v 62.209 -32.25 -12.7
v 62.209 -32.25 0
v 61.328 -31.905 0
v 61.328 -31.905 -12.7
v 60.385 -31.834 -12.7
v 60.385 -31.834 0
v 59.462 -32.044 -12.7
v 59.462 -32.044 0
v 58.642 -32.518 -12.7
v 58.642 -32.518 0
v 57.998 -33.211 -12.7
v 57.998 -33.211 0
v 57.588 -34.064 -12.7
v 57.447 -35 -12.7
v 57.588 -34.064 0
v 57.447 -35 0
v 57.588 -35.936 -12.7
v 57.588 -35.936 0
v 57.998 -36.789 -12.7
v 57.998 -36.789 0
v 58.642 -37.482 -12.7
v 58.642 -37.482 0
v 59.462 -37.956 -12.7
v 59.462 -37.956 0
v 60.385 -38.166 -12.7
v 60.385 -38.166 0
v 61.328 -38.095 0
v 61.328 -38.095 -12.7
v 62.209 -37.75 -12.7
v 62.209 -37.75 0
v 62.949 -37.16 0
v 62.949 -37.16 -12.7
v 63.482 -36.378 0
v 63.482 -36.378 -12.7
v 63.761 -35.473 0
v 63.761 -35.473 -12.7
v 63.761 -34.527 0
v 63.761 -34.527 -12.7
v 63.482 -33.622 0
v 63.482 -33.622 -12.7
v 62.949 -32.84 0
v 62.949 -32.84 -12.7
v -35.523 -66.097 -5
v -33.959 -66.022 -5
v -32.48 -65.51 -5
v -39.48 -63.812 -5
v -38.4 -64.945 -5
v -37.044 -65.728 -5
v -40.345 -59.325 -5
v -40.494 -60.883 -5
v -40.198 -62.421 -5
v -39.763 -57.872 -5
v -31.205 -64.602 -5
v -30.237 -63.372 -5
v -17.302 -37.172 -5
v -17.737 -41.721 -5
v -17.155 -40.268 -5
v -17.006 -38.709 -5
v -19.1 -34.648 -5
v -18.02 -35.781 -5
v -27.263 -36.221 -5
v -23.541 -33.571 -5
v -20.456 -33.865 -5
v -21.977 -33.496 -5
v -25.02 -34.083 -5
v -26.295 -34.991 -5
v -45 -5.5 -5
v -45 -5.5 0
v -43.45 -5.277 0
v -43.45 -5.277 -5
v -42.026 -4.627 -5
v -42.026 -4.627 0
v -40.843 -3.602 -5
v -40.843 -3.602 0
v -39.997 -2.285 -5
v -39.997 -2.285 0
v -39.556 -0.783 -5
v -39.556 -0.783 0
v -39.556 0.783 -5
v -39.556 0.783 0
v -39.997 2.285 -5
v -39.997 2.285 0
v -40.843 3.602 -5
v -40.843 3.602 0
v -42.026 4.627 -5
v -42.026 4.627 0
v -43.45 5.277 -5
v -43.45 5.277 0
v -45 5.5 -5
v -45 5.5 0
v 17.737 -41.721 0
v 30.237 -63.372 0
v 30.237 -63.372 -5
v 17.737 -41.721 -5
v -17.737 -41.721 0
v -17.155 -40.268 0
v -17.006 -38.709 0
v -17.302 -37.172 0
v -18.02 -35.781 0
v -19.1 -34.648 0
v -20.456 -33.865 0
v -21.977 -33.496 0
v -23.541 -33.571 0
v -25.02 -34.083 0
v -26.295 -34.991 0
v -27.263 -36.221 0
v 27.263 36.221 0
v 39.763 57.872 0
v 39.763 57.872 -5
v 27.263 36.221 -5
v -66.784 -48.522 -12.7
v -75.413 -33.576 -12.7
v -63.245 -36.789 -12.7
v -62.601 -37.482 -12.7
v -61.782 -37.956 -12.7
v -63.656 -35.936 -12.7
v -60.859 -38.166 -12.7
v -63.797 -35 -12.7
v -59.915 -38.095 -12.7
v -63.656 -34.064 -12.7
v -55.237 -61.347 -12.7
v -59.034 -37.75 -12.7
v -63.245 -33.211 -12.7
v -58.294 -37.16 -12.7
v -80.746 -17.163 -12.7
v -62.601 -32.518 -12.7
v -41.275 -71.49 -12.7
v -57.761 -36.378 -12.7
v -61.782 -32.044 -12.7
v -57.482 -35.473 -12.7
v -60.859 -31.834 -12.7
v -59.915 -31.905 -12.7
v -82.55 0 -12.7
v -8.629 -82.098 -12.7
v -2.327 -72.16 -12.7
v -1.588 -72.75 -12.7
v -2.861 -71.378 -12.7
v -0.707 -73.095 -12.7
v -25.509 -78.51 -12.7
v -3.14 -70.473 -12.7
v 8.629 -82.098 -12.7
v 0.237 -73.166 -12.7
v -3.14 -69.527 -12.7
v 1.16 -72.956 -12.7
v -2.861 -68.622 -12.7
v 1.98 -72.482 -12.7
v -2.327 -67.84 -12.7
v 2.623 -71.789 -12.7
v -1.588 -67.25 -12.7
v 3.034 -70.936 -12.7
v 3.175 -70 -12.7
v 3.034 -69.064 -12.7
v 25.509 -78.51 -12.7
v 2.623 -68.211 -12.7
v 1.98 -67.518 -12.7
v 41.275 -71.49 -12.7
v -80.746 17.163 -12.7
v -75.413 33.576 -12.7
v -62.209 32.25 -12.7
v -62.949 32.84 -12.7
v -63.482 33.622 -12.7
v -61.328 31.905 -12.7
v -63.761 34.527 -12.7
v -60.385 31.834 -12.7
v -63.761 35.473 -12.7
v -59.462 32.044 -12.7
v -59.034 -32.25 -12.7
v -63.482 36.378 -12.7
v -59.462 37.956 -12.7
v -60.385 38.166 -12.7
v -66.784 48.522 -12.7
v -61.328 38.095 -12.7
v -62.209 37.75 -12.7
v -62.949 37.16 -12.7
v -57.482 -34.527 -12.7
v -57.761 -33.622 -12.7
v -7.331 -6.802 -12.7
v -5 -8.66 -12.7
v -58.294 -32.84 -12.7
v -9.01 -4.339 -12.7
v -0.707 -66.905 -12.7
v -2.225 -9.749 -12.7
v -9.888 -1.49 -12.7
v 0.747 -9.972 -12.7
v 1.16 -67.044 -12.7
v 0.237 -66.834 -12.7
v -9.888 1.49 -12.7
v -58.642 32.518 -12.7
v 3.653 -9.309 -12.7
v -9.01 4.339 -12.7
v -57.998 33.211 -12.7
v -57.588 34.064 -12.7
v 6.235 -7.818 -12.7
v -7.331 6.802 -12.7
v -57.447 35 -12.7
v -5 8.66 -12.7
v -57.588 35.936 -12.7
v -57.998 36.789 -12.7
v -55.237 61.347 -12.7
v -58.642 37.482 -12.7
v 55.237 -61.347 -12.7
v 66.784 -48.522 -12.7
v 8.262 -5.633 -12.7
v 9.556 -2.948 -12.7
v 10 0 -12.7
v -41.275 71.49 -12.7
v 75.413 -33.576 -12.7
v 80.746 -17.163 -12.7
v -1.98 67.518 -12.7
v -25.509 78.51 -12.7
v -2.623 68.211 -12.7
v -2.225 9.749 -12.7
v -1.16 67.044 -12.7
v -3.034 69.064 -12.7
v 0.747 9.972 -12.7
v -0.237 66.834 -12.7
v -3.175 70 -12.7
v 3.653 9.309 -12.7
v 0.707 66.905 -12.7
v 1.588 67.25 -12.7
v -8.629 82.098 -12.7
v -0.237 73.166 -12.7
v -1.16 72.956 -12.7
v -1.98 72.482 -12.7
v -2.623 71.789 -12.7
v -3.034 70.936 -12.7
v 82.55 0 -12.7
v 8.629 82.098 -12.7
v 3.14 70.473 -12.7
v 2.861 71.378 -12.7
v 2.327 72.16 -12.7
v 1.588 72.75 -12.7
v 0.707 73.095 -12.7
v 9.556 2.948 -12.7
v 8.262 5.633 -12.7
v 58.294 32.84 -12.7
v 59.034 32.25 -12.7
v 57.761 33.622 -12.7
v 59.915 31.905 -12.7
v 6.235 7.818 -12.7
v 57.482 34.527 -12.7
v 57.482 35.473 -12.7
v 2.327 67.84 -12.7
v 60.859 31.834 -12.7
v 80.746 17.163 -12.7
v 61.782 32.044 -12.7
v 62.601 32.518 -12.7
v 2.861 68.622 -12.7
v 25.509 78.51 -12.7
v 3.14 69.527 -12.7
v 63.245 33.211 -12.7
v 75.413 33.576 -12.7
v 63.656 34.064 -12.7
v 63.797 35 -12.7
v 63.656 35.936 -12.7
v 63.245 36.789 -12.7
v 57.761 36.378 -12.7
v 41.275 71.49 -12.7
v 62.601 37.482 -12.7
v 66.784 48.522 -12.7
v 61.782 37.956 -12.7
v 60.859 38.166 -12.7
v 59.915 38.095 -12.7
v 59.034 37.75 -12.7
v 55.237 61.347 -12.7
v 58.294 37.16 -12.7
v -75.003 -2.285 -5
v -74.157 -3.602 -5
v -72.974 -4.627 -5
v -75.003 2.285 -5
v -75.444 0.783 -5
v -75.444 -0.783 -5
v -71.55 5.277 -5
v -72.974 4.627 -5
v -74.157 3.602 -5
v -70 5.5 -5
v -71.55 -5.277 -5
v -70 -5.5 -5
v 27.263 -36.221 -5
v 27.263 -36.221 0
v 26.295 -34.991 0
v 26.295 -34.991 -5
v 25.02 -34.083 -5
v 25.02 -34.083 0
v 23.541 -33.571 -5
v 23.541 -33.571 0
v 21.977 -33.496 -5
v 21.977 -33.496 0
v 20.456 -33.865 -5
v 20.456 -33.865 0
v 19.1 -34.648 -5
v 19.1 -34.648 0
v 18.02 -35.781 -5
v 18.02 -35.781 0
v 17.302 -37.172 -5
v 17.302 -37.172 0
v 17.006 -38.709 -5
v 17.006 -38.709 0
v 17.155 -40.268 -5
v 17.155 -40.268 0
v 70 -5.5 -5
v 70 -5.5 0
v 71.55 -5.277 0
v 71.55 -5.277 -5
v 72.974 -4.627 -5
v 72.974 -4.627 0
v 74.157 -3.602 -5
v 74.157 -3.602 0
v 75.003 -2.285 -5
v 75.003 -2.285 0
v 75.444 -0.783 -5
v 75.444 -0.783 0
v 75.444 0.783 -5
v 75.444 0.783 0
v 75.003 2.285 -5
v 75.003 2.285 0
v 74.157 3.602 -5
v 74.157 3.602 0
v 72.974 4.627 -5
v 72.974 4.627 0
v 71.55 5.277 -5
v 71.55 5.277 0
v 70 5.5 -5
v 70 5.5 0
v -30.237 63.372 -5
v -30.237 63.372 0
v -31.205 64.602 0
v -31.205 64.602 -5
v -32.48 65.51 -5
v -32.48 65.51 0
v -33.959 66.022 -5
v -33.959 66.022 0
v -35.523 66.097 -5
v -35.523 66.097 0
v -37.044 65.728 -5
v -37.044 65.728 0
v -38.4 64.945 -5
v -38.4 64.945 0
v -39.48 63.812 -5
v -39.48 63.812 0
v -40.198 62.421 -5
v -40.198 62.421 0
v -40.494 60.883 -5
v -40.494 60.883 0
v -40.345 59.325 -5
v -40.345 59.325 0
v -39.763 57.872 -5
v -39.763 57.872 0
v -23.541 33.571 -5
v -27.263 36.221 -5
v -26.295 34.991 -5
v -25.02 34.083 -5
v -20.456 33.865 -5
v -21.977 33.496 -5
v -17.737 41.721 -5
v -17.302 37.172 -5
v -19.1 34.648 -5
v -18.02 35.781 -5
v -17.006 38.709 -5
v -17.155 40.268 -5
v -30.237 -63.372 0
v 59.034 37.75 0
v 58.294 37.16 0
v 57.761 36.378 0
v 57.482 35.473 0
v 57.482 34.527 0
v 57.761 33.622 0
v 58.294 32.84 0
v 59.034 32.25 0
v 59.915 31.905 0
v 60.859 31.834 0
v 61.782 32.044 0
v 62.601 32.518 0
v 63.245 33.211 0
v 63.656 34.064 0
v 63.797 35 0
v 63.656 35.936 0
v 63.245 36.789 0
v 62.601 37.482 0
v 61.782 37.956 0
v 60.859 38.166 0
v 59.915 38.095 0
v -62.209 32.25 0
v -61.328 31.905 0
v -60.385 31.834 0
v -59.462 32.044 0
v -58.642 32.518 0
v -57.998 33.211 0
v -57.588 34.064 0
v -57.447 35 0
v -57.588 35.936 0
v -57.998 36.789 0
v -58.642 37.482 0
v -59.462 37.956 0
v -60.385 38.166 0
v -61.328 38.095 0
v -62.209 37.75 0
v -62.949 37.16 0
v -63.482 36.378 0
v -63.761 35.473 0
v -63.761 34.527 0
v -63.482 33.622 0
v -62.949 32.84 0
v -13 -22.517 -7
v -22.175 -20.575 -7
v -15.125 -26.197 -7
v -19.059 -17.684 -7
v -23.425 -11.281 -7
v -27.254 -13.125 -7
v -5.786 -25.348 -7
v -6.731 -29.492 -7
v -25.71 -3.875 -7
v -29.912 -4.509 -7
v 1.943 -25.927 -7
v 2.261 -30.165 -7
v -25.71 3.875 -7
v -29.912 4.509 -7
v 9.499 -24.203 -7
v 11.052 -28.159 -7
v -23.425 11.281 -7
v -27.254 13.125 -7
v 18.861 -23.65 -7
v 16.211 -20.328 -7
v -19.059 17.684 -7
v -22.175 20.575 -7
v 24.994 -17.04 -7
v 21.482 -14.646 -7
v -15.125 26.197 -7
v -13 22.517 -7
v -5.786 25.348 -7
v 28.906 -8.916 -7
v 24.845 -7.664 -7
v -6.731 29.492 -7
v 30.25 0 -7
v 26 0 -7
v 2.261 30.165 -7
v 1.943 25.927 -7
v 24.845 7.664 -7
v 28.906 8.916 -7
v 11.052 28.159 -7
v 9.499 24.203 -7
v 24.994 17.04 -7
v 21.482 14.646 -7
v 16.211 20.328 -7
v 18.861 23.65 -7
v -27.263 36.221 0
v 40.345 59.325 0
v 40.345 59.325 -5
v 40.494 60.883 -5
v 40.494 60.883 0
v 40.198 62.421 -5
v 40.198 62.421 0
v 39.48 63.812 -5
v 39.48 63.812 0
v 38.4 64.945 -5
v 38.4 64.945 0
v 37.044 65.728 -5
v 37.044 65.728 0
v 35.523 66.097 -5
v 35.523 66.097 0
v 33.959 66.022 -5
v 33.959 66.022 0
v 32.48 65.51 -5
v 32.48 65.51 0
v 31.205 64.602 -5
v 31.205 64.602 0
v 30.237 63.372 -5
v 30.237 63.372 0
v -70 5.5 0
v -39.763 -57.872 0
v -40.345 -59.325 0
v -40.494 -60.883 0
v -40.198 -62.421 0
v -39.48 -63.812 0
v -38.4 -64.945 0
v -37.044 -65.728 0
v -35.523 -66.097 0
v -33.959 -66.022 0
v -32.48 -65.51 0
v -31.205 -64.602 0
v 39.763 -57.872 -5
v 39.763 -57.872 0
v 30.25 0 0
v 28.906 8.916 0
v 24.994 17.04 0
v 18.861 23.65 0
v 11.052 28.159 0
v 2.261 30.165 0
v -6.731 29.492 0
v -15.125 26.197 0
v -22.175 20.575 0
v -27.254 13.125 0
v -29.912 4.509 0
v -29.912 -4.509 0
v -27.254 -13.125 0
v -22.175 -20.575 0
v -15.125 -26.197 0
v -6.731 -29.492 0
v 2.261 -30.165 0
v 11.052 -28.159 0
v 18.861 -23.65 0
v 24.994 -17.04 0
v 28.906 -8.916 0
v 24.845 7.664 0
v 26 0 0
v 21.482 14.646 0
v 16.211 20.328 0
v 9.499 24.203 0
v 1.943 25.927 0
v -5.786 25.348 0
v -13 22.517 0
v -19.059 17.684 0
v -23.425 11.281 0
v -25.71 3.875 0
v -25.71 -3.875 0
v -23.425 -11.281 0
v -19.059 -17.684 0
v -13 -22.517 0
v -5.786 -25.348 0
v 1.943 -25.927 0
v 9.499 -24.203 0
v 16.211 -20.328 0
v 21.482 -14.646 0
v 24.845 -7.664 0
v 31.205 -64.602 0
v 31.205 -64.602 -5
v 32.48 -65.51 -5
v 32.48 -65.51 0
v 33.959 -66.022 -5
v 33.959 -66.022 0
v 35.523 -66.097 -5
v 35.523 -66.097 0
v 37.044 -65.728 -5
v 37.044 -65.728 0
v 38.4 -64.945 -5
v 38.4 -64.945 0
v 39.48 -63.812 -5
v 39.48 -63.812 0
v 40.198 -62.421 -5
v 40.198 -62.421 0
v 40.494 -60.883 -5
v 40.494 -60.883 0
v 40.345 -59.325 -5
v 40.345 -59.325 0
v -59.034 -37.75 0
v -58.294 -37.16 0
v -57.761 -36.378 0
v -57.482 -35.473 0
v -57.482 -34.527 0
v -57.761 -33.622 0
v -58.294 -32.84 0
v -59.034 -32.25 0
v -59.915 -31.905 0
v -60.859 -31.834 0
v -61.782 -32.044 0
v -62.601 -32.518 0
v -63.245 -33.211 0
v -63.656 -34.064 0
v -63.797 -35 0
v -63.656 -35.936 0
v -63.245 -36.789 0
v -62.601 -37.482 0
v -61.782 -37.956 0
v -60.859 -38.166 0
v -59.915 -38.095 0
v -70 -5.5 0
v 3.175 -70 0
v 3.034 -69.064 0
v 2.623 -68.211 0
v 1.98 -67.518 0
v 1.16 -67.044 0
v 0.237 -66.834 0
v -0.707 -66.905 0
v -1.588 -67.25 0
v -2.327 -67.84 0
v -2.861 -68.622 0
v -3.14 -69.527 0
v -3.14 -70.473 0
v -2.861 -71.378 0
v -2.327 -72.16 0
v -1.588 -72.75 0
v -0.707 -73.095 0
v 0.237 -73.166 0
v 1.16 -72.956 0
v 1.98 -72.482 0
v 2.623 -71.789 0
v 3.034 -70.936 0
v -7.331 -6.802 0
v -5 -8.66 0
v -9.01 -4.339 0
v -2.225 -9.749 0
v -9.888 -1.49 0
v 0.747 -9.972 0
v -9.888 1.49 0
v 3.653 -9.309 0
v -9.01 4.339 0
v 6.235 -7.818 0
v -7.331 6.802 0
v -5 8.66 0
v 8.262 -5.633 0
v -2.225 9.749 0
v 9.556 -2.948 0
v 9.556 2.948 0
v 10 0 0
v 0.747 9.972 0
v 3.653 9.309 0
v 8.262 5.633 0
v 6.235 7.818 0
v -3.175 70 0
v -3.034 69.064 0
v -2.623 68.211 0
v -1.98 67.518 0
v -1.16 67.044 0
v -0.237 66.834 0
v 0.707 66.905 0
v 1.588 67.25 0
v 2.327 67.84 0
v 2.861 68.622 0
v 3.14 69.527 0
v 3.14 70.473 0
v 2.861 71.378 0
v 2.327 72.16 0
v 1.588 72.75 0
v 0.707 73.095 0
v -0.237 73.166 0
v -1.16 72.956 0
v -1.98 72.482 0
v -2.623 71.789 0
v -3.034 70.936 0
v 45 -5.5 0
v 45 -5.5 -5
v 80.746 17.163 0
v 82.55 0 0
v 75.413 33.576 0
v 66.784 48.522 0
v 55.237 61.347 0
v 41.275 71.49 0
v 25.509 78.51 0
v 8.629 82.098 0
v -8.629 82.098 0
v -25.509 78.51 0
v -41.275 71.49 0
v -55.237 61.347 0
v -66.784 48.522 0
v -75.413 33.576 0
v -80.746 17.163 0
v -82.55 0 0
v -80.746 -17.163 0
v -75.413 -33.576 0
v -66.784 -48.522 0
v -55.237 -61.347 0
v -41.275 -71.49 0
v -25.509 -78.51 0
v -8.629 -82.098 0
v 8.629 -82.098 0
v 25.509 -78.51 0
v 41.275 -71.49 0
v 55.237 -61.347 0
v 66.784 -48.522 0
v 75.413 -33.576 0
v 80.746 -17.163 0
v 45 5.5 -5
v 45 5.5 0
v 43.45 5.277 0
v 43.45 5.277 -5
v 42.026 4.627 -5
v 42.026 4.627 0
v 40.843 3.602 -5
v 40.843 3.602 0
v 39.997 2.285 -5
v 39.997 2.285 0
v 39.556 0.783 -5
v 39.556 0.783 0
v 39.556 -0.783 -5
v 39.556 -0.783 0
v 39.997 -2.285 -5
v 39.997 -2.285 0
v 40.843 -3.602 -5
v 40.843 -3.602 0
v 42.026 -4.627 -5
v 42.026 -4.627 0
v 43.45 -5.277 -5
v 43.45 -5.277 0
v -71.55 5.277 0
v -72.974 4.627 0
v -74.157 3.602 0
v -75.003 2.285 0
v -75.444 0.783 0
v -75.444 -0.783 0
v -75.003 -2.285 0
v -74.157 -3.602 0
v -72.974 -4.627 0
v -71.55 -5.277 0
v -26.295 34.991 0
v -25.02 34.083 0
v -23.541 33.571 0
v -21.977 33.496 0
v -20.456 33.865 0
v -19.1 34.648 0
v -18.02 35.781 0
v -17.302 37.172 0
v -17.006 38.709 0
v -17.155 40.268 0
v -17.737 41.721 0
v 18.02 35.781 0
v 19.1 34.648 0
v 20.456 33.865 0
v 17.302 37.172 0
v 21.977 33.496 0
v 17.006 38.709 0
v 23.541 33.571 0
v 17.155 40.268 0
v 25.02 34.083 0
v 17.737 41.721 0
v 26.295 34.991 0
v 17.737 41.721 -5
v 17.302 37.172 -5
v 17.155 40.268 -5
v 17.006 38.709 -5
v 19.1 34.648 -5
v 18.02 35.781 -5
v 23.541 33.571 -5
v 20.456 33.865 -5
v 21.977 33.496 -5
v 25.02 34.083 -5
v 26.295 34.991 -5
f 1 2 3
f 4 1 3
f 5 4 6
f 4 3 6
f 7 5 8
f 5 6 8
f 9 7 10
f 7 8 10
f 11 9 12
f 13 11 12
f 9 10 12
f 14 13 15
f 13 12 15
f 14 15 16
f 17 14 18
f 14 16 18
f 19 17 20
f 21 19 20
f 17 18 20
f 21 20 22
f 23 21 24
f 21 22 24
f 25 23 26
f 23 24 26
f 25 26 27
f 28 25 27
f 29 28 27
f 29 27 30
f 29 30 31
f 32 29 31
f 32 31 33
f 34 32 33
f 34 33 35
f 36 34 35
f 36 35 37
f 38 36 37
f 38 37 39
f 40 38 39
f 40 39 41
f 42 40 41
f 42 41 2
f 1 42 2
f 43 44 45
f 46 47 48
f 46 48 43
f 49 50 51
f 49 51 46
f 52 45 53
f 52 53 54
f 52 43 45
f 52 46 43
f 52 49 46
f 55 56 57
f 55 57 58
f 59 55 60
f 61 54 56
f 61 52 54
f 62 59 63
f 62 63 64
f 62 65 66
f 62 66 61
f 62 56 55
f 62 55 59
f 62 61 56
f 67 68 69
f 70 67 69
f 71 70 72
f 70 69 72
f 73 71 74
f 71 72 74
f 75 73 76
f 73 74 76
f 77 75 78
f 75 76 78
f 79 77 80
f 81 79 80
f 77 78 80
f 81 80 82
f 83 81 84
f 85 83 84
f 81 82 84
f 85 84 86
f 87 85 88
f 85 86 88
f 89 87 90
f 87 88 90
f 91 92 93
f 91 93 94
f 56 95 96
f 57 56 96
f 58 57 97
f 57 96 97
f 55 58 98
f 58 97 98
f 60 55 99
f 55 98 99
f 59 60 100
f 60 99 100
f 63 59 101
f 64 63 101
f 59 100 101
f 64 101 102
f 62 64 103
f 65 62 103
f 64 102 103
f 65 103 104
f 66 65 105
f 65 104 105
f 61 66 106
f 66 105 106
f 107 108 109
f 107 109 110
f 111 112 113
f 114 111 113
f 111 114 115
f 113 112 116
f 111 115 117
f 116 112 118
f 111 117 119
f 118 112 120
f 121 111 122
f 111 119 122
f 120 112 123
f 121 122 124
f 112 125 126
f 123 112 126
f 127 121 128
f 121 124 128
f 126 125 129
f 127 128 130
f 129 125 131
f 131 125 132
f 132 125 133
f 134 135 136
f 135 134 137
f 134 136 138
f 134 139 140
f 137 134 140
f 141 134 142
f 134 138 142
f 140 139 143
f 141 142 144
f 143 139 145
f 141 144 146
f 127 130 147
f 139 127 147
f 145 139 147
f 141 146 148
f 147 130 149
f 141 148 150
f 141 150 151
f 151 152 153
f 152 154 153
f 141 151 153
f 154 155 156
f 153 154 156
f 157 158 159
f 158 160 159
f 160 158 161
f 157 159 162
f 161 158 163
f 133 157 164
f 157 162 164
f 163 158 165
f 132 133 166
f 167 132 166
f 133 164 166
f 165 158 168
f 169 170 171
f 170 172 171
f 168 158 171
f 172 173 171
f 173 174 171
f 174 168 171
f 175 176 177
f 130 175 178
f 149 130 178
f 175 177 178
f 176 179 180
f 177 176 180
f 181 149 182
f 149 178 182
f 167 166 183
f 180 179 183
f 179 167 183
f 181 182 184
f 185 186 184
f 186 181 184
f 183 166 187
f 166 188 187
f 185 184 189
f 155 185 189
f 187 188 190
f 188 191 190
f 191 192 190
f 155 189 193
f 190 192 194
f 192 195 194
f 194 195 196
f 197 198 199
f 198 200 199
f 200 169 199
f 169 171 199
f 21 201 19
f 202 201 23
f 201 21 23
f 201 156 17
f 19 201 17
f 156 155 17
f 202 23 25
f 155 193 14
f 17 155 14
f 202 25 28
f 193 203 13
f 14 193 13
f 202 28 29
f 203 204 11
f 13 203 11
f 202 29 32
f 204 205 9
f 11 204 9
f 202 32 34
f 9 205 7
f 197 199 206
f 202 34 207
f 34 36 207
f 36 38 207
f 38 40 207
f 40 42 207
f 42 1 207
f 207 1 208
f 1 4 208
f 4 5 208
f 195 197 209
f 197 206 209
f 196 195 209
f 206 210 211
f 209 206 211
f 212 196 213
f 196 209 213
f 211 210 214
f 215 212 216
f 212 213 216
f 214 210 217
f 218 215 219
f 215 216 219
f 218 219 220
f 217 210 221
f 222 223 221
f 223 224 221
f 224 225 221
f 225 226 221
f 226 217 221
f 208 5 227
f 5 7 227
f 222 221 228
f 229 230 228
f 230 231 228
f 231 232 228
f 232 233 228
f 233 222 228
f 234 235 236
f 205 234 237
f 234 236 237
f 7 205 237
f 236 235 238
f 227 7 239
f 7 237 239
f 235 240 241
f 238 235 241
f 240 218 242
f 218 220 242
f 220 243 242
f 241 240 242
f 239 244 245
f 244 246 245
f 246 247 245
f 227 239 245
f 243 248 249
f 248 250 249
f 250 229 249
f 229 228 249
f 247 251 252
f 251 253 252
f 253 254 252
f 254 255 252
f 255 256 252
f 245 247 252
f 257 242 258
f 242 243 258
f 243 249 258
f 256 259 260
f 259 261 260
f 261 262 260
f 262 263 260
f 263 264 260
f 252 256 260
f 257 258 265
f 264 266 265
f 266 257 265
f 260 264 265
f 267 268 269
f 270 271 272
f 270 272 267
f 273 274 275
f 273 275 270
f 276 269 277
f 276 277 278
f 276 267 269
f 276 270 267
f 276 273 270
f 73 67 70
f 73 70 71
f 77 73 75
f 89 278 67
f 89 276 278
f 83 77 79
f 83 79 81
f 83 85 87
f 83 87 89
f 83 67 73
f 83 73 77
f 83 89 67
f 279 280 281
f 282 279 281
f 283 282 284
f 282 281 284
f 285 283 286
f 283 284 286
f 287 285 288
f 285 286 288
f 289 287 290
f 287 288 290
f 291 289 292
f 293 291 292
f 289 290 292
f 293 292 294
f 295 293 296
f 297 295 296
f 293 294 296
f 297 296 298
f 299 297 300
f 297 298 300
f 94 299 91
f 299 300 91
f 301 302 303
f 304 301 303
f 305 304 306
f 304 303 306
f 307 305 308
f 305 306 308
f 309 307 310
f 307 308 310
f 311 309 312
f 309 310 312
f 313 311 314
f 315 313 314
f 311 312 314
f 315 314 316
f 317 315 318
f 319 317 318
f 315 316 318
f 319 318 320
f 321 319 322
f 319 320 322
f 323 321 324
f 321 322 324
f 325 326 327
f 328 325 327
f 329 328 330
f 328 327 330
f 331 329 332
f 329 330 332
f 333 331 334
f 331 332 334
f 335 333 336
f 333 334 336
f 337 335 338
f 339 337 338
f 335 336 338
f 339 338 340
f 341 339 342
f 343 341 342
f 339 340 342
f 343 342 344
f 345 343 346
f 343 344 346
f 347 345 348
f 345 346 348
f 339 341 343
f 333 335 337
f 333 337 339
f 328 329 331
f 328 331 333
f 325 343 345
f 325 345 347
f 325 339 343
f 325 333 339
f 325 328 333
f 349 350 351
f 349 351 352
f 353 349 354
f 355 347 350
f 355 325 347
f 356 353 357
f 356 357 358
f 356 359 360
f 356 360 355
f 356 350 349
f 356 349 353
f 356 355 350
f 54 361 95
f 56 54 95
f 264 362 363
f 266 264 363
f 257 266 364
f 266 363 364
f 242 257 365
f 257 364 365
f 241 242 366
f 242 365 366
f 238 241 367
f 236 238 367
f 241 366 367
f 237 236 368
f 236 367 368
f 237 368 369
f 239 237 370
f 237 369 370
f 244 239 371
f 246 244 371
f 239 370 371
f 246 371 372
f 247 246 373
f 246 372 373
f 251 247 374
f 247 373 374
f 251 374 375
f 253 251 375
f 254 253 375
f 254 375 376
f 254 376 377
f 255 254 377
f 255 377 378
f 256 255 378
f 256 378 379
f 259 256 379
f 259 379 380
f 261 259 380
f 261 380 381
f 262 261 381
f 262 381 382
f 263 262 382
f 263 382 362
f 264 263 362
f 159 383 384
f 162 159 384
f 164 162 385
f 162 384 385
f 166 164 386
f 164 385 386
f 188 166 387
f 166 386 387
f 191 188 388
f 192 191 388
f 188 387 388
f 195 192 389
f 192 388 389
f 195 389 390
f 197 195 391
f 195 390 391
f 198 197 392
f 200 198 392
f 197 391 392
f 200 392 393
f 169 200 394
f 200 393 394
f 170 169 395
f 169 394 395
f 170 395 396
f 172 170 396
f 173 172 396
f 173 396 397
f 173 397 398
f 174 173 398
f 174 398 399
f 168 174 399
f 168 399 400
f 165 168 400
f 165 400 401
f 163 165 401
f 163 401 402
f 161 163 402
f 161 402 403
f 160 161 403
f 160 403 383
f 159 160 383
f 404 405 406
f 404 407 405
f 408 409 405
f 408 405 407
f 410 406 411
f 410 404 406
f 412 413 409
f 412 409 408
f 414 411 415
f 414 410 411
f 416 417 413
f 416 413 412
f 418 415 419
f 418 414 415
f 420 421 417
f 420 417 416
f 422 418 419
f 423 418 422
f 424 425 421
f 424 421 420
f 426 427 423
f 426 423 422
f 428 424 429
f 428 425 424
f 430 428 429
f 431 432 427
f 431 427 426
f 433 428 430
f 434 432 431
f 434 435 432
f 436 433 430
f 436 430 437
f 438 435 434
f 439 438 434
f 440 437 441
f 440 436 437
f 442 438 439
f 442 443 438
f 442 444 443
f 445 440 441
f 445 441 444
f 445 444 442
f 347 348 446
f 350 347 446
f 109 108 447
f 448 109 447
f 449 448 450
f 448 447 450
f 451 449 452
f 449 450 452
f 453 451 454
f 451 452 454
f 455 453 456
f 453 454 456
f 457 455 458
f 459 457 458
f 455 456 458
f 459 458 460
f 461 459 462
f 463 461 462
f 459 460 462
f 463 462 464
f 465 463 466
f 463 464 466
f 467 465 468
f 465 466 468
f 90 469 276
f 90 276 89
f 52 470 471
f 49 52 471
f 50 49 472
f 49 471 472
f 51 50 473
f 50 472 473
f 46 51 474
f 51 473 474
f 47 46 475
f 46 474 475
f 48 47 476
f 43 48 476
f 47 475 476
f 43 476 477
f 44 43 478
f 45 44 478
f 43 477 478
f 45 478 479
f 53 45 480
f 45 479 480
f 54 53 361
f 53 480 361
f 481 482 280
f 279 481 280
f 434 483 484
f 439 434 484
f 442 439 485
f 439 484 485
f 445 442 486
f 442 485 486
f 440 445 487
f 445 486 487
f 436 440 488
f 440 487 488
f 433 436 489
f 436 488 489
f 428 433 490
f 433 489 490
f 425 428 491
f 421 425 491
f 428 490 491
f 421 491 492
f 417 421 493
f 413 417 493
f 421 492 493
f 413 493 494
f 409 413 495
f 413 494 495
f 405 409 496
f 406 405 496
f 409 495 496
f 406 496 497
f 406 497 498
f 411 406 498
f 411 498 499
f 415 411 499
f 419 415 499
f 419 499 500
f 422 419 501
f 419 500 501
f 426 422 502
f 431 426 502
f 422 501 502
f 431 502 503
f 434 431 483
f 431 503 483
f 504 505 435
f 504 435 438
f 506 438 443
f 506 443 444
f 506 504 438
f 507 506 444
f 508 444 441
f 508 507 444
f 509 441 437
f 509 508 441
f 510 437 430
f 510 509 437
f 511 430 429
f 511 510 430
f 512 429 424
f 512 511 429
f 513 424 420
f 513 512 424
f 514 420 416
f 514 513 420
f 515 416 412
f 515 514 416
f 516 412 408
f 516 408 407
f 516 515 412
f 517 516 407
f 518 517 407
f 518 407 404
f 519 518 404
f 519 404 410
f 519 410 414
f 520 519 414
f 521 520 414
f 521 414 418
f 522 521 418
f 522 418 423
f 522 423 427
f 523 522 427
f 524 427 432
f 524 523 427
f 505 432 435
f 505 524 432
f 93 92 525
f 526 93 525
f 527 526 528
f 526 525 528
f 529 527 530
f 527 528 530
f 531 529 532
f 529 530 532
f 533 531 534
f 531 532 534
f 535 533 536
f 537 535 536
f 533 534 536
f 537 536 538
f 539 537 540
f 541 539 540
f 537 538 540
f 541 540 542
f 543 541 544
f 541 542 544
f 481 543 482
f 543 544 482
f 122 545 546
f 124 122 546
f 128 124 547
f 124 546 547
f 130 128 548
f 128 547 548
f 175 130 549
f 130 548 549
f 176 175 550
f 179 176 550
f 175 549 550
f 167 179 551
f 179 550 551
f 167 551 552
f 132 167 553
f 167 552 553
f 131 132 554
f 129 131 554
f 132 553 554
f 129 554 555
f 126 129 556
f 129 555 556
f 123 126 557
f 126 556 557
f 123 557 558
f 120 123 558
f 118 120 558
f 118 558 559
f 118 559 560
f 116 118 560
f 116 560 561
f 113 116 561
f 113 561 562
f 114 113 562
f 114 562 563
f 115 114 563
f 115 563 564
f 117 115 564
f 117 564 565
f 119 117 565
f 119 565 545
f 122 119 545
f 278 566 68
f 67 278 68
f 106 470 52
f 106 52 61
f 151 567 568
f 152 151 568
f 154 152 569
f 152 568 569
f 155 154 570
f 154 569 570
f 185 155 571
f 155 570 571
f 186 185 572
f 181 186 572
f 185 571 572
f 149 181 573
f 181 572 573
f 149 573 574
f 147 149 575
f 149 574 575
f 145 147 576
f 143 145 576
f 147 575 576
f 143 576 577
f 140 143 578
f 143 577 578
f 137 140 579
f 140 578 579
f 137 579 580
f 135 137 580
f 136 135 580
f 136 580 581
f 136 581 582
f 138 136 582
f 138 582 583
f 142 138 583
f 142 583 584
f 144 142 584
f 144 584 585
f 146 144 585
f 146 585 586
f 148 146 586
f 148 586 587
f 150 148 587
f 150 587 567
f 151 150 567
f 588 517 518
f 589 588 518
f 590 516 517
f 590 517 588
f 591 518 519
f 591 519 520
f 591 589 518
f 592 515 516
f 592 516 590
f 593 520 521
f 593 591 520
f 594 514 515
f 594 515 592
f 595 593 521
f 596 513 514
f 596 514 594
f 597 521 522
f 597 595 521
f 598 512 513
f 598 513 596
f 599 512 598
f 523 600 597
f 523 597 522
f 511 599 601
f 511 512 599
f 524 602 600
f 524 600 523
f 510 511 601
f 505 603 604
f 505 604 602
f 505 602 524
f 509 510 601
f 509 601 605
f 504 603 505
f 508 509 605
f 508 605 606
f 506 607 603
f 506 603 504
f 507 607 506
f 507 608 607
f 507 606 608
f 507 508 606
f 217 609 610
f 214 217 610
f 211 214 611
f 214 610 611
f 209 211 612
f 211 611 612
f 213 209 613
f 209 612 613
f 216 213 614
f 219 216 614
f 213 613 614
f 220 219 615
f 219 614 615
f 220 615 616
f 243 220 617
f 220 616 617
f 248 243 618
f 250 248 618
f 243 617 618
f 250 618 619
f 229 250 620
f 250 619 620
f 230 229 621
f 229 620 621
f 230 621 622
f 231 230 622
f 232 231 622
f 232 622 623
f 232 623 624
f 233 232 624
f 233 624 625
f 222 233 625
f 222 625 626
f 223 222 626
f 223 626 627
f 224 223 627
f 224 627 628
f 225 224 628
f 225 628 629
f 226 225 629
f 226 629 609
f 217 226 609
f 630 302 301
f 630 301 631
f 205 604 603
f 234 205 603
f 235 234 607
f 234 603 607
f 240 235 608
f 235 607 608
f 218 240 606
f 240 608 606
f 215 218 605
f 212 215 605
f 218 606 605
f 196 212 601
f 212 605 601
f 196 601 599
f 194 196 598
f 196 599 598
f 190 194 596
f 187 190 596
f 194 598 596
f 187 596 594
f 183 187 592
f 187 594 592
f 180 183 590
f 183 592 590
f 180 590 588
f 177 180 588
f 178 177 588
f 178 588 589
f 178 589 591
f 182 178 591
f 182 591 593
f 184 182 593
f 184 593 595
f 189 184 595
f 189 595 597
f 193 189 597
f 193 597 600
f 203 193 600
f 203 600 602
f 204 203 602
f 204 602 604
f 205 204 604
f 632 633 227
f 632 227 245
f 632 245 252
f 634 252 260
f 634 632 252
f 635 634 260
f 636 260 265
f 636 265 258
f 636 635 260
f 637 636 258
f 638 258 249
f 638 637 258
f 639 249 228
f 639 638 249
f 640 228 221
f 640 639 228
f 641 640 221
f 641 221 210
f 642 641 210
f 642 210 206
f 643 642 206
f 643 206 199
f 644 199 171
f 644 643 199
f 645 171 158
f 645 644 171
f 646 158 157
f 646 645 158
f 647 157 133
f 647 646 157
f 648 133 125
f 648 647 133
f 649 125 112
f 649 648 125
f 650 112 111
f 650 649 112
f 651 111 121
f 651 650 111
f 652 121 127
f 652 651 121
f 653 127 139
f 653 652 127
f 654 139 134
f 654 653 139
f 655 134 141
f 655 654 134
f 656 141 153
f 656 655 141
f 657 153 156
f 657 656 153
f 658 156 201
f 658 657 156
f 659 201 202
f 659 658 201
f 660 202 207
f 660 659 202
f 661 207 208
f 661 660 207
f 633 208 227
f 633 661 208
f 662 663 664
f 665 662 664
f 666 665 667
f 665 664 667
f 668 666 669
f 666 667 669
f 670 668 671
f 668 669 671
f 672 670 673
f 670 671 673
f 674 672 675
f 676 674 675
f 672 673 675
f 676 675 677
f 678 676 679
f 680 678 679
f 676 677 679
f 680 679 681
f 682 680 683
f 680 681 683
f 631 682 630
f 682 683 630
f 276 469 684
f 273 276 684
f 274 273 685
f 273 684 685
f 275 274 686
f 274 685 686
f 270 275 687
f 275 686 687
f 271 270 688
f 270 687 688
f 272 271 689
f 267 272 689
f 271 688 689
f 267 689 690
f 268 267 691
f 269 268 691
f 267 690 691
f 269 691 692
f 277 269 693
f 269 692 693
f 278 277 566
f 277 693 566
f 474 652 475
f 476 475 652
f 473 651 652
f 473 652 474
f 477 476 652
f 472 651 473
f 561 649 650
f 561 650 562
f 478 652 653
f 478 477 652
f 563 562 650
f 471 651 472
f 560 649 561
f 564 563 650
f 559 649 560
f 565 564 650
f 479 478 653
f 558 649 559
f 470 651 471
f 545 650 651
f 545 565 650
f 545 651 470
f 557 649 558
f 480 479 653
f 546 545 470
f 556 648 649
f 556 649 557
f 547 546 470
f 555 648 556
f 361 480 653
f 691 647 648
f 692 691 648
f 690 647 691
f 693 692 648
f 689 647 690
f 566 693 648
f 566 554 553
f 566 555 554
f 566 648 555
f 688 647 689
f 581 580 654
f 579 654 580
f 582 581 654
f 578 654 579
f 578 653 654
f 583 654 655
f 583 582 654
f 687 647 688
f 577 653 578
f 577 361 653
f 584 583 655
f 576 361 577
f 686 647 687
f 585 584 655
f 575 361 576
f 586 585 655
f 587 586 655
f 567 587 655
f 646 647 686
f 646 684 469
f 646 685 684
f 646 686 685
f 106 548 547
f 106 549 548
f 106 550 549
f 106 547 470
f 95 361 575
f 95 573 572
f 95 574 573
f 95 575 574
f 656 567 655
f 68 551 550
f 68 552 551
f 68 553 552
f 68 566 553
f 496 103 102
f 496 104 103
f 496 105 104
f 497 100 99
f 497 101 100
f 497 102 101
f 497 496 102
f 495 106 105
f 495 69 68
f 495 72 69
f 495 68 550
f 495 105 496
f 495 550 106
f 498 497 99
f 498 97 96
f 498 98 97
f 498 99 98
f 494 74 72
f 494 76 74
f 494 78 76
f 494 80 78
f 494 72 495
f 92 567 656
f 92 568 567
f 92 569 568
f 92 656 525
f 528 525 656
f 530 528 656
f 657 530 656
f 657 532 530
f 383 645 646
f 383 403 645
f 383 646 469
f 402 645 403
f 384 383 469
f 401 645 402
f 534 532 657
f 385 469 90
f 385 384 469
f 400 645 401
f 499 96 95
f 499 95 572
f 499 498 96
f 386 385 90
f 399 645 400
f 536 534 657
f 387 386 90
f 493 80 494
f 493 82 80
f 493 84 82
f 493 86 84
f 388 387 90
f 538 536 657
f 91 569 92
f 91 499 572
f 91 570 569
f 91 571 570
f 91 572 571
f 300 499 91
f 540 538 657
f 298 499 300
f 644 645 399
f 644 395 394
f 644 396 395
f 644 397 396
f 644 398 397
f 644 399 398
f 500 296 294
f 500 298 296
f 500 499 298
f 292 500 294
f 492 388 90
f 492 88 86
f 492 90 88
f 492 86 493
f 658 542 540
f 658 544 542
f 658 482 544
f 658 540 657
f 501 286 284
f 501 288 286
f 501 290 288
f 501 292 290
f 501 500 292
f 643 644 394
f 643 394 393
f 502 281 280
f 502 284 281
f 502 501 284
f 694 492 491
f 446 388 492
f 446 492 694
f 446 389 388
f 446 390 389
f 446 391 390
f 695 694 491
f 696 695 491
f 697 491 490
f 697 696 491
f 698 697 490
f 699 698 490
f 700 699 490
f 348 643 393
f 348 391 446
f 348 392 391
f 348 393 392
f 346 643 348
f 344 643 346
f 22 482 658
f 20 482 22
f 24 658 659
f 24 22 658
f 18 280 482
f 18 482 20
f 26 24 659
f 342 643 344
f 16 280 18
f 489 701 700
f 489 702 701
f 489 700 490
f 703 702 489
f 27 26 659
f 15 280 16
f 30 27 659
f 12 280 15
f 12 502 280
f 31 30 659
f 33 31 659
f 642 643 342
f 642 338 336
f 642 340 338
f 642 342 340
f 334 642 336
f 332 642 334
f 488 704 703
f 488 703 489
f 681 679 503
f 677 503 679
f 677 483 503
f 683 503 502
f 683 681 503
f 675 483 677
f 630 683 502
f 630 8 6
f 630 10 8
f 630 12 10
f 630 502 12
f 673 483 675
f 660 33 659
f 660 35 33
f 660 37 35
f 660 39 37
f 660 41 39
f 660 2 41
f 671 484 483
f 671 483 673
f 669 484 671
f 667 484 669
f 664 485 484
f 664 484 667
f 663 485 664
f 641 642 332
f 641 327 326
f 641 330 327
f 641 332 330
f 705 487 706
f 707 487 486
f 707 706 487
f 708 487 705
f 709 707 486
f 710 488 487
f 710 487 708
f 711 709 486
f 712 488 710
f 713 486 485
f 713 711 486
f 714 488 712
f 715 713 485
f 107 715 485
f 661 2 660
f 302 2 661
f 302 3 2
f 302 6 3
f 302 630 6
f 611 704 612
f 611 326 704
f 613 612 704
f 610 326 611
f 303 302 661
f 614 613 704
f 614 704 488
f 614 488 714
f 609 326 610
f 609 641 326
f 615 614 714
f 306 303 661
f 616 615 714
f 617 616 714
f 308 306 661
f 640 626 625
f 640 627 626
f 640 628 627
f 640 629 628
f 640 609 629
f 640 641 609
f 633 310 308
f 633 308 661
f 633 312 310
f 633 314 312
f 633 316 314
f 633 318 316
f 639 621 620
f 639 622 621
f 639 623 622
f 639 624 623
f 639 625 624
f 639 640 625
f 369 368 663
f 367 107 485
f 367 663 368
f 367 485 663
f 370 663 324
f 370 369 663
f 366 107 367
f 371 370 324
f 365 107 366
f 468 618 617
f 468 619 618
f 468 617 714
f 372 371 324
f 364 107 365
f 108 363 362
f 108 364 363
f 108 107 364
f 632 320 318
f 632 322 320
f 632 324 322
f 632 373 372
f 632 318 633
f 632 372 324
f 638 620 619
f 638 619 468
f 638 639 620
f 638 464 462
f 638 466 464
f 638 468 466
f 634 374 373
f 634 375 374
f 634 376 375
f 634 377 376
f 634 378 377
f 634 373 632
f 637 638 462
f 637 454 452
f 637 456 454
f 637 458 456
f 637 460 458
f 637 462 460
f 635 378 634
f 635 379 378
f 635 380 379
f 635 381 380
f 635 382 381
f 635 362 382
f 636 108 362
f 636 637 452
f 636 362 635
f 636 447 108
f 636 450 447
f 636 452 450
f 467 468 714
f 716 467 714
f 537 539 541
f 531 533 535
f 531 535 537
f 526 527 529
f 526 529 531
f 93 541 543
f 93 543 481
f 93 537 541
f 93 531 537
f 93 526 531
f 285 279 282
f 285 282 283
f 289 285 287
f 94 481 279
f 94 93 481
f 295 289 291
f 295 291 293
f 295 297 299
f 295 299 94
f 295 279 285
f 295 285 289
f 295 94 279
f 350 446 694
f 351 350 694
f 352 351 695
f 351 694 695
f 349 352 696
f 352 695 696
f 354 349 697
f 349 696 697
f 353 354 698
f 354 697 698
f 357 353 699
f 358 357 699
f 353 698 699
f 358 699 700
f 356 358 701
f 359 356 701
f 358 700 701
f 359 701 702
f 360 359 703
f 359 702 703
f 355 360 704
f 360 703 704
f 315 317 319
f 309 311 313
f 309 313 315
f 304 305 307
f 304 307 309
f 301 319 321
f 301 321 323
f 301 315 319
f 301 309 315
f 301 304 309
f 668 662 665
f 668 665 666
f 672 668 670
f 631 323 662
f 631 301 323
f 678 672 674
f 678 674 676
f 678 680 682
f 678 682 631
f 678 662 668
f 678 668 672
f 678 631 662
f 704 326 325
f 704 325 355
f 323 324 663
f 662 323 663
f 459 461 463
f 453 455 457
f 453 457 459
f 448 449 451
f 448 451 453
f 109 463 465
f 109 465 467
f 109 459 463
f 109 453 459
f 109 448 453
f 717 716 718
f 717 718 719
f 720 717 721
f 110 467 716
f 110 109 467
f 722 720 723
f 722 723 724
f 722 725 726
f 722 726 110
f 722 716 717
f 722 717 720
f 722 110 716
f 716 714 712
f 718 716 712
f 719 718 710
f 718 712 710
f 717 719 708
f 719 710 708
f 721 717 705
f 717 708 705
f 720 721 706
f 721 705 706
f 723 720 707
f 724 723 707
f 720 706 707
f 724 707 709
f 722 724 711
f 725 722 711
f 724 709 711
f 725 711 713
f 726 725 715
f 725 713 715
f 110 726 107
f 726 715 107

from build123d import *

# Parameters (mm, degrees)
SKETCH_R              = 82.55
PAD_DEPTH             = 12.7
SKETCH001_R           = 10
POCKET_DEPTH          = 12.701
SKETCH002_R           = 30.25
SKETCH002_R_2         = 26
POCKET001_DEPTH       = 7
SKETCH003_R           = 3.175
POCKET002_DEPTH       = 480.364597
POLARPATTERN_COUNT    = 6
POCKET003_DEPTH       = 5
POLARPATTERN001_COUNT = 6


with BuildPart() as part:
    # Sketch → Pad (new body)
    with BuildSketch(Plane.XY):
        Circle(SKETCH_R)
    extrude(amount=-PAD_DEPTH)

    # Sketch001 (on Face2 of Pad) → Pocket (cut, through all)
    with BuildSketch(Plane.XY):
        Circle(SKETCH001_R)
    extrude(amount=-POCKET_DEPTH, mode=Mode.SUBTRACT)

    # Sketch002 (on Face2 of Pocket) → Pocket001 (cut)
    with BuildSketch(Plane.XY):
        Circle(SKETCH002_R)
        Circle(SKETCH002_R_2, mode=Mode.SUBTRACT)
    extrude(amount=-POCKET001_DEPTH, mode=Mode.SUBTRACT)

    # Sketch003 (on Face2 of Pocket001) → Pocket002 (cut, through all)
    with BuildSketch(Plane.XY):
        with Locations((0, -70)):
            Circle(SKETCH003_R)
    pocket002 = extrude(amount=-POCKET002_DEPTH, mode=Mode.SUBTRACT)

    # PolarPattern: Pocket002 ×6 about axis
    polarpattern_axis = Axis((0, 0, 0), (0, 0, 1))
    for i in range(1, POLARPATTERN_COUNT):
        add(pocket002.rotate(polarpattern_axis, i * 360 / POLARPATTERN_COUNT), mode=Mode.SUBTRACT)

    # Sketch004 (on Face2 of PolarPattern) → Pocket003 (cut)
    with BuildSketch(Plane.XY):
        with BuildLine():
            ThreePointArc((-70, 5.5), (-75.5, 0), (-70, -5.5))
            Line((-70, -5.5), (-45, -5.5))
            ThreePointArc((-45, -5.5), (-39.5, 0), (-45, 5.5))
            Line((-70, 5.5), (-45, 5.5))
        make_face()
    pocket003 = extrude(amount=-POCKET003_DEPTH, mode=Mode.SUBTRACT)

    # PolarPattern001: Pocket003 ×6 about axis
    polarpattern001_axis = Axis((0, 0, 0), (0, 0, 1))
    for i in range(1, POLARPATTERN001_COUNT):
        add(pocket003.rotate(polarpattern001_axis, i * 360 / POLARPATTERN001_COUNT), mode=Mode.SUBTRACT)


solid = part.part
